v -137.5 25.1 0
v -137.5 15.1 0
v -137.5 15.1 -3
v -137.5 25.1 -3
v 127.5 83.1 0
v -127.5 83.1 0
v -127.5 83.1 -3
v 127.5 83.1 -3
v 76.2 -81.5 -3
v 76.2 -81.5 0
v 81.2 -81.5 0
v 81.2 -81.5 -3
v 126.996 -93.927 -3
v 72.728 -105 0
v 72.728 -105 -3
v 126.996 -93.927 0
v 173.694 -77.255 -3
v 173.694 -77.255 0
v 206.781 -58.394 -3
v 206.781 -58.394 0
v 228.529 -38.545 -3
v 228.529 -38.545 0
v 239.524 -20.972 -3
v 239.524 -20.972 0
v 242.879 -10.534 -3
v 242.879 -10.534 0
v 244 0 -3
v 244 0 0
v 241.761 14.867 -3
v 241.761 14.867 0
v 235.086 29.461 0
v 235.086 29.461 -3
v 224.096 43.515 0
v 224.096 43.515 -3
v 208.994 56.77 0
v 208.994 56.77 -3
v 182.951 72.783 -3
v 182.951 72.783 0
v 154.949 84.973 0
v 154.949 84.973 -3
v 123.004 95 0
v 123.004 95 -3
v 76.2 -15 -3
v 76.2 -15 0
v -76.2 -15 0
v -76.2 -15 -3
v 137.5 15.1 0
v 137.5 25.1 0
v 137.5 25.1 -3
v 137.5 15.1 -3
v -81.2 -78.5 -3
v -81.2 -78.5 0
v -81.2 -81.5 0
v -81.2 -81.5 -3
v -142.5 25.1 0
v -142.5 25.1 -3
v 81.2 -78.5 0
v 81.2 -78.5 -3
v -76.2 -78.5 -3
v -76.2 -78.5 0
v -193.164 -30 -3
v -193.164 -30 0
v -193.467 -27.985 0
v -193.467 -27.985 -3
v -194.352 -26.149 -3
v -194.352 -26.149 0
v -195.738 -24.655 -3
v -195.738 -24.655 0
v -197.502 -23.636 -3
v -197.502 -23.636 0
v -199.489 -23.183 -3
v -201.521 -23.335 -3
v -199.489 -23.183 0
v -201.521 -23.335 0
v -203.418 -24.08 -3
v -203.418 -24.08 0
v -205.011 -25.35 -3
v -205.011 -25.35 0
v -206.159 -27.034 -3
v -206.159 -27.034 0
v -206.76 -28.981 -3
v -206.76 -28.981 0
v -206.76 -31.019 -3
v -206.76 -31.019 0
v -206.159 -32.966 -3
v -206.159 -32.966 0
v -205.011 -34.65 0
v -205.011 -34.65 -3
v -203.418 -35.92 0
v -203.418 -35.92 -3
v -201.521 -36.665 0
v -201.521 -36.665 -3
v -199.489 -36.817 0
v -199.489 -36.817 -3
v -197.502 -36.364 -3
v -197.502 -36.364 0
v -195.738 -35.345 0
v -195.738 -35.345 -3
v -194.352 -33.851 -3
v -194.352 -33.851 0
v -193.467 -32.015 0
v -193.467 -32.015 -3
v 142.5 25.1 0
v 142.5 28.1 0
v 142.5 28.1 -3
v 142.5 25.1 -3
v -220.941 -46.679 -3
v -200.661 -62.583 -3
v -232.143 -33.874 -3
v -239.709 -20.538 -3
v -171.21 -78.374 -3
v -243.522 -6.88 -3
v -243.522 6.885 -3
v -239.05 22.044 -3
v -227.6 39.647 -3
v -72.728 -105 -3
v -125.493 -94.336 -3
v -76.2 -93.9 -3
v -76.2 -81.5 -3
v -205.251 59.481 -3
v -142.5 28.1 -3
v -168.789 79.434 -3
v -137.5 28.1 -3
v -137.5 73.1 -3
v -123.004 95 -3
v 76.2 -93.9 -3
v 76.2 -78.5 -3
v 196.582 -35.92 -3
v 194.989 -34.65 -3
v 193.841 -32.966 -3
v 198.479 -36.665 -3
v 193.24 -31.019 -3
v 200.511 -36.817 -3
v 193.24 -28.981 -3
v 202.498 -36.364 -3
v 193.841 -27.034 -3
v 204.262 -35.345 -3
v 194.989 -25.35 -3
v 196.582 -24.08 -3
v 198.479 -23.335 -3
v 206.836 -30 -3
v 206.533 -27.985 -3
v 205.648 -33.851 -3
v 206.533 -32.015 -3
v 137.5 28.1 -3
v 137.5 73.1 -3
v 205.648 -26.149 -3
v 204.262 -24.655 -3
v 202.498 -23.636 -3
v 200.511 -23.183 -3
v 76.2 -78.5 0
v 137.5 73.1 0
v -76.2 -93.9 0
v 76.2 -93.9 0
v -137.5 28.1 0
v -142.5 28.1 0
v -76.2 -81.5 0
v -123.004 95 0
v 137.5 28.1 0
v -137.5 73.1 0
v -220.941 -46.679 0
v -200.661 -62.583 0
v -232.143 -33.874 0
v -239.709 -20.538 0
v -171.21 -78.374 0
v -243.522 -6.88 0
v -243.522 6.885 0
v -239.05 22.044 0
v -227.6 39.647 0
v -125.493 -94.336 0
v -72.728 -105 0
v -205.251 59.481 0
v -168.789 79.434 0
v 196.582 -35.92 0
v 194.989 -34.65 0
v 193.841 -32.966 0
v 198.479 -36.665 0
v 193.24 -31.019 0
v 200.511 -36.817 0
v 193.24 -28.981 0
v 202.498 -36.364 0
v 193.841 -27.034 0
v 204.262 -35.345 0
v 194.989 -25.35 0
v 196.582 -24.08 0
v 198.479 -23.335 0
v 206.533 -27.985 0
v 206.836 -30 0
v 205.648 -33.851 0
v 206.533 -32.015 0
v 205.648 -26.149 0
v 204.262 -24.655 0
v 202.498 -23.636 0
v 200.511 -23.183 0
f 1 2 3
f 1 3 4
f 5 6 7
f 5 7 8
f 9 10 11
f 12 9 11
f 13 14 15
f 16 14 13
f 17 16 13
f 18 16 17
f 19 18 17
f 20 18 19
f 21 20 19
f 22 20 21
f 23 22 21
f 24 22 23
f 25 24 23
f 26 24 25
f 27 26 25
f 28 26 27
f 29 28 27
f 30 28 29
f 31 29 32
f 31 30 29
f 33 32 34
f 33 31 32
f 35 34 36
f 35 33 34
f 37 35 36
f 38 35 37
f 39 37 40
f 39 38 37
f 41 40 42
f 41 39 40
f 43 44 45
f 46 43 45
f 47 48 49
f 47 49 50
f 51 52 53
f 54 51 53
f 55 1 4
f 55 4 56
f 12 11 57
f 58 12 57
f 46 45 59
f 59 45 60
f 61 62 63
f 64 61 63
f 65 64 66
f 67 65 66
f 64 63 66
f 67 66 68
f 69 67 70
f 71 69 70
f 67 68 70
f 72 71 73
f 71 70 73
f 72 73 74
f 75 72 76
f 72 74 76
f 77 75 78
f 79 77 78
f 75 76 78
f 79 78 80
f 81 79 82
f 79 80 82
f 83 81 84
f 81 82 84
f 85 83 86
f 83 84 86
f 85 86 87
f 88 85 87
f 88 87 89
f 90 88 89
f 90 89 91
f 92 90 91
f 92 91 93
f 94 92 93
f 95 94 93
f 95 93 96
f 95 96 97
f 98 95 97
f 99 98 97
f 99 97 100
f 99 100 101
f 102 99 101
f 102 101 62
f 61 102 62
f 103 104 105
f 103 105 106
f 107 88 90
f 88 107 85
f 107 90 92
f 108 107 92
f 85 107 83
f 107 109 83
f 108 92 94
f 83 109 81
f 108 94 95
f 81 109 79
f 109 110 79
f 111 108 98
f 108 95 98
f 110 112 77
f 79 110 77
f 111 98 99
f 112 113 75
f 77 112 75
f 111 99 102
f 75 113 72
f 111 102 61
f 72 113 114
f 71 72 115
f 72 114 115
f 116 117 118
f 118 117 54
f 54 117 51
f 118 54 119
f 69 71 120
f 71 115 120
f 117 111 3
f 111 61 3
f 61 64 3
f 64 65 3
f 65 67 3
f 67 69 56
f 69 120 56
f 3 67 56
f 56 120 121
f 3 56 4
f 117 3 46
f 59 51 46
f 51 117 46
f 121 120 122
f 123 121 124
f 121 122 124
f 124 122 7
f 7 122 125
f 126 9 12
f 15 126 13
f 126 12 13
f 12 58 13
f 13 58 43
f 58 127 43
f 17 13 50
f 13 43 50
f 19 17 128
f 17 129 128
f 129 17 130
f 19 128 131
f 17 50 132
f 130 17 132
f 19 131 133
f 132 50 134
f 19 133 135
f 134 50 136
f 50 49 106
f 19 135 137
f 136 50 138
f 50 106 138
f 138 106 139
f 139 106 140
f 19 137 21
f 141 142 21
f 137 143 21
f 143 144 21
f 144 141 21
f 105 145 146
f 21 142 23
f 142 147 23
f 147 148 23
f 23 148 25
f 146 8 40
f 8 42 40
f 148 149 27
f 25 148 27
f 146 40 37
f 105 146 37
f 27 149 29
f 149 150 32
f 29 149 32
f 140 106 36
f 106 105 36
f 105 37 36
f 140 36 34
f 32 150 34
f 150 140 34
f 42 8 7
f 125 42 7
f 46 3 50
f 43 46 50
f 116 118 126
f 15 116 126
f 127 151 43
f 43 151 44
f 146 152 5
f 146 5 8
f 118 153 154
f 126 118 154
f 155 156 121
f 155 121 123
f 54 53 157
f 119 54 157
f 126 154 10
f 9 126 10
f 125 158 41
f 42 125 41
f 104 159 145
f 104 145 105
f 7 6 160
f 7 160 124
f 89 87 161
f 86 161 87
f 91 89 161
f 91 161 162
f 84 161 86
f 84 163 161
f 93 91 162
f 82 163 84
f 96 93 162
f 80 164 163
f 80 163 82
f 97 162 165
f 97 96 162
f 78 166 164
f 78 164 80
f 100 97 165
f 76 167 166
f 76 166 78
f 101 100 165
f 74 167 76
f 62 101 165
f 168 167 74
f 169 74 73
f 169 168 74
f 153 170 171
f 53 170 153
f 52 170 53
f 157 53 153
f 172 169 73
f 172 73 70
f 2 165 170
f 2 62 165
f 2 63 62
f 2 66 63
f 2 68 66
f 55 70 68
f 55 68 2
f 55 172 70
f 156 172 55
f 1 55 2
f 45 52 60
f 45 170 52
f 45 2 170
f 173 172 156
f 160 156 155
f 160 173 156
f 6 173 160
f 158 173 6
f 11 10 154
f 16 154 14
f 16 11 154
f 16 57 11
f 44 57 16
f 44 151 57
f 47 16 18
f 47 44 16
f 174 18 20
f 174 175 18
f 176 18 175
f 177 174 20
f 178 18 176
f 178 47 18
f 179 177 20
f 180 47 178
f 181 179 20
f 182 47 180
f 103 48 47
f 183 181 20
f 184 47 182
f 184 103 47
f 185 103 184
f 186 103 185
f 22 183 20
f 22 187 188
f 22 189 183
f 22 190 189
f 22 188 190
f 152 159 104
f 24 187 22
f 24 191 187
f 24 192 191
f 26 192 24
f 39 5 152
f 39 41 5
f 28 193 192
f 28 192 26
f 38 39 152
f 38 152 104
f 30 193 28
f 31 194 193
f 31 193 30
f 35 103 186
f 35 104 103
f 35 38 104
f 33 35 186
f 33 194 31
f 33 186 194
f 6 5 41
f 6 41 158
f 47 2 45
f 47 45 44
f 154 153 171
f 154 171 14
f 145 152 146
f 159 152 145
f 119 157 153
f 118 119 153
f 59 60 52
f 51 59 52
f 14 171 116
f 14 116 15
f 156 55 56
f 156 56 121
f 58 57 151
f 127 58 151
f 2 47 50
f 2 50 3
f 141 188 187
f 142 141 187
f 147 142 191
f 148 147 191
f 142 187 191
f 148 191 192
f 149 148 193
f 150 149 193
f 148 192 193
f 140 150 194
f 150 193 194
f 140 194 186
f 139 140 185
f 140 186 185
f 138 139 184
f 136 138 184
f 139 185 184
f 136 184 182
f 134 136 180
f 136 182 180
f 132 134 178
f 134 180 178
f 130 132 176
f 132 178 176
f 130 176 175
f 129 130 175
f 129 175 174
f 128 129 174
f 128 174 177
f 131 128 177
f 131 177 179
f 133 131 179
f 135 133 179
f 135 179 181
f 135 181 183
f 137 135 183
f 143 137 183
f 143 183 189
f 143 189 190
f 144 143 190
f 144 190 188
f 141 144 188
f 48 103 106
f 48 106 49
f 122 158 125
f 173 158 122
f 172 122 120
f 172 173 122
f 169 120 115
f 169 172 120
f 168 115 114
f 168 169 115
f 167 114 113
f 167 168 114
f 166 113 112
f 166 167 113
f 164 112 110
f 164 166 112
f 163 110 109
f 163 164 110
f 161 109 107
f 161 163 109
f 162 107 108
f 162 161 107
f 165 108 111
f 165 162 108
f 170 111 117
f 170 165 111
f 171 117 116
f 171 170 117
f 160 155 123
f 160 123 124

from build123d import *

# Parameters (mm, degrees)
SKETCH1_RX          = 244
SKETCH1_RY          = 110
BOSS_EXTRUDE1_DEPTH = 3
SKETCH12_R          = 6.83635542
CUT_EXTRUDE8_DEPTH  = 4
SKETCH13_W          = 488
SKETCH13_H          = 5
SKETCH13_H_2        = 15
CUT_EXTRUDE9_DEPTH  = 4
CUT_EXTRUDE10_DEPTH = 10
CUT_EXTRUDE11_DEPTH = 10
CHAMFER1_SIZE       = 10


with BuildPart() as part:
    # Sketch1 → Boss-Extrude1 (new body)
    with BuildSketch(Plane.XY):
        with Locations((0, 0)):
            Ellipse(SKETCH1_RX, SKETCH1_RY)
    extrude(amount=-BOSS_EXTRUDE1_DEPTH)

    # Sketch12 → Cut-Extrude8 (cut, through all)
    with BuildSketch(Plane.XY):
        with Locations((200, -30)):
            Circle(SKETCH12_R)
        with Locations((-200, -30)):
            Circle(SKETCH12_R)
    extrude(amount=-CUT_EXTRUDE8_DEPTH, mode=Mode.SUBTRACT)

    # Sketch13 → Cut-Extrude9 (cut, through all)
    with BuildSketch(Plane.XY):
        with Locations((0, -107.5)):
            Rectangle(SKETCH13_W, SKETCH13_H)
        with Locations((0, 102.5)):
            Rectangle(SKETCH13_W, SKETCH13_H_2)
    extrude(amount=-CUT_EXTRUDE9_DEPTH, mode=Mode.SUBTRACT)

    # Sketch14 → Cut-Extrude10 (cut)
    with BuildSketch(Plane.XY):
        Polygon((-76.2, -81.5), (-76.2, -93.9), (76.2, -93.9), (76.2, -81.5), (81.2, -81.5), (81.2, -78.5), (76.2, -78.5), (76.2, -15), (-76.2, -15), (-76.2, -78.5), (-81.2, -78.5), (-81.2, -81.5), align=None)
    extrude(amount=-CUT_EXTRUDE10_DEPTH, mode=Mode.SUBTRACT)

    # Sketch15 → Cut-Extrude11 (cut)
    with BuildSketch(Plane.XY):
        Polygon((-137.5, 83.1), (137.5, 83.1), (137.5, 28.1), (142.5, 28.1), (142.5, 25.1), (137.5, 25.1), (137.5, 15.1), (-137.5, 15.1), (-137.5, 25.1), (-142.5, 25.1), (-142.5, 28.1), (-137.5, 28.1), align=None)
    extrude(amount=-CUT_EXTRUDE11_DEPTH, mode=Mode.SUBTRACT)

    # Chamfer1
    chamfer1_edges = [part.edges().sort_by_distance(p)[0] for p in [
        (-137.5, 83.1, -1.5),
        (137.5, 83.1, -1.5),
    ]]
    chamfer(chamfer1_edges, length=CHAMFER1_SIZE)


solid = part.part
